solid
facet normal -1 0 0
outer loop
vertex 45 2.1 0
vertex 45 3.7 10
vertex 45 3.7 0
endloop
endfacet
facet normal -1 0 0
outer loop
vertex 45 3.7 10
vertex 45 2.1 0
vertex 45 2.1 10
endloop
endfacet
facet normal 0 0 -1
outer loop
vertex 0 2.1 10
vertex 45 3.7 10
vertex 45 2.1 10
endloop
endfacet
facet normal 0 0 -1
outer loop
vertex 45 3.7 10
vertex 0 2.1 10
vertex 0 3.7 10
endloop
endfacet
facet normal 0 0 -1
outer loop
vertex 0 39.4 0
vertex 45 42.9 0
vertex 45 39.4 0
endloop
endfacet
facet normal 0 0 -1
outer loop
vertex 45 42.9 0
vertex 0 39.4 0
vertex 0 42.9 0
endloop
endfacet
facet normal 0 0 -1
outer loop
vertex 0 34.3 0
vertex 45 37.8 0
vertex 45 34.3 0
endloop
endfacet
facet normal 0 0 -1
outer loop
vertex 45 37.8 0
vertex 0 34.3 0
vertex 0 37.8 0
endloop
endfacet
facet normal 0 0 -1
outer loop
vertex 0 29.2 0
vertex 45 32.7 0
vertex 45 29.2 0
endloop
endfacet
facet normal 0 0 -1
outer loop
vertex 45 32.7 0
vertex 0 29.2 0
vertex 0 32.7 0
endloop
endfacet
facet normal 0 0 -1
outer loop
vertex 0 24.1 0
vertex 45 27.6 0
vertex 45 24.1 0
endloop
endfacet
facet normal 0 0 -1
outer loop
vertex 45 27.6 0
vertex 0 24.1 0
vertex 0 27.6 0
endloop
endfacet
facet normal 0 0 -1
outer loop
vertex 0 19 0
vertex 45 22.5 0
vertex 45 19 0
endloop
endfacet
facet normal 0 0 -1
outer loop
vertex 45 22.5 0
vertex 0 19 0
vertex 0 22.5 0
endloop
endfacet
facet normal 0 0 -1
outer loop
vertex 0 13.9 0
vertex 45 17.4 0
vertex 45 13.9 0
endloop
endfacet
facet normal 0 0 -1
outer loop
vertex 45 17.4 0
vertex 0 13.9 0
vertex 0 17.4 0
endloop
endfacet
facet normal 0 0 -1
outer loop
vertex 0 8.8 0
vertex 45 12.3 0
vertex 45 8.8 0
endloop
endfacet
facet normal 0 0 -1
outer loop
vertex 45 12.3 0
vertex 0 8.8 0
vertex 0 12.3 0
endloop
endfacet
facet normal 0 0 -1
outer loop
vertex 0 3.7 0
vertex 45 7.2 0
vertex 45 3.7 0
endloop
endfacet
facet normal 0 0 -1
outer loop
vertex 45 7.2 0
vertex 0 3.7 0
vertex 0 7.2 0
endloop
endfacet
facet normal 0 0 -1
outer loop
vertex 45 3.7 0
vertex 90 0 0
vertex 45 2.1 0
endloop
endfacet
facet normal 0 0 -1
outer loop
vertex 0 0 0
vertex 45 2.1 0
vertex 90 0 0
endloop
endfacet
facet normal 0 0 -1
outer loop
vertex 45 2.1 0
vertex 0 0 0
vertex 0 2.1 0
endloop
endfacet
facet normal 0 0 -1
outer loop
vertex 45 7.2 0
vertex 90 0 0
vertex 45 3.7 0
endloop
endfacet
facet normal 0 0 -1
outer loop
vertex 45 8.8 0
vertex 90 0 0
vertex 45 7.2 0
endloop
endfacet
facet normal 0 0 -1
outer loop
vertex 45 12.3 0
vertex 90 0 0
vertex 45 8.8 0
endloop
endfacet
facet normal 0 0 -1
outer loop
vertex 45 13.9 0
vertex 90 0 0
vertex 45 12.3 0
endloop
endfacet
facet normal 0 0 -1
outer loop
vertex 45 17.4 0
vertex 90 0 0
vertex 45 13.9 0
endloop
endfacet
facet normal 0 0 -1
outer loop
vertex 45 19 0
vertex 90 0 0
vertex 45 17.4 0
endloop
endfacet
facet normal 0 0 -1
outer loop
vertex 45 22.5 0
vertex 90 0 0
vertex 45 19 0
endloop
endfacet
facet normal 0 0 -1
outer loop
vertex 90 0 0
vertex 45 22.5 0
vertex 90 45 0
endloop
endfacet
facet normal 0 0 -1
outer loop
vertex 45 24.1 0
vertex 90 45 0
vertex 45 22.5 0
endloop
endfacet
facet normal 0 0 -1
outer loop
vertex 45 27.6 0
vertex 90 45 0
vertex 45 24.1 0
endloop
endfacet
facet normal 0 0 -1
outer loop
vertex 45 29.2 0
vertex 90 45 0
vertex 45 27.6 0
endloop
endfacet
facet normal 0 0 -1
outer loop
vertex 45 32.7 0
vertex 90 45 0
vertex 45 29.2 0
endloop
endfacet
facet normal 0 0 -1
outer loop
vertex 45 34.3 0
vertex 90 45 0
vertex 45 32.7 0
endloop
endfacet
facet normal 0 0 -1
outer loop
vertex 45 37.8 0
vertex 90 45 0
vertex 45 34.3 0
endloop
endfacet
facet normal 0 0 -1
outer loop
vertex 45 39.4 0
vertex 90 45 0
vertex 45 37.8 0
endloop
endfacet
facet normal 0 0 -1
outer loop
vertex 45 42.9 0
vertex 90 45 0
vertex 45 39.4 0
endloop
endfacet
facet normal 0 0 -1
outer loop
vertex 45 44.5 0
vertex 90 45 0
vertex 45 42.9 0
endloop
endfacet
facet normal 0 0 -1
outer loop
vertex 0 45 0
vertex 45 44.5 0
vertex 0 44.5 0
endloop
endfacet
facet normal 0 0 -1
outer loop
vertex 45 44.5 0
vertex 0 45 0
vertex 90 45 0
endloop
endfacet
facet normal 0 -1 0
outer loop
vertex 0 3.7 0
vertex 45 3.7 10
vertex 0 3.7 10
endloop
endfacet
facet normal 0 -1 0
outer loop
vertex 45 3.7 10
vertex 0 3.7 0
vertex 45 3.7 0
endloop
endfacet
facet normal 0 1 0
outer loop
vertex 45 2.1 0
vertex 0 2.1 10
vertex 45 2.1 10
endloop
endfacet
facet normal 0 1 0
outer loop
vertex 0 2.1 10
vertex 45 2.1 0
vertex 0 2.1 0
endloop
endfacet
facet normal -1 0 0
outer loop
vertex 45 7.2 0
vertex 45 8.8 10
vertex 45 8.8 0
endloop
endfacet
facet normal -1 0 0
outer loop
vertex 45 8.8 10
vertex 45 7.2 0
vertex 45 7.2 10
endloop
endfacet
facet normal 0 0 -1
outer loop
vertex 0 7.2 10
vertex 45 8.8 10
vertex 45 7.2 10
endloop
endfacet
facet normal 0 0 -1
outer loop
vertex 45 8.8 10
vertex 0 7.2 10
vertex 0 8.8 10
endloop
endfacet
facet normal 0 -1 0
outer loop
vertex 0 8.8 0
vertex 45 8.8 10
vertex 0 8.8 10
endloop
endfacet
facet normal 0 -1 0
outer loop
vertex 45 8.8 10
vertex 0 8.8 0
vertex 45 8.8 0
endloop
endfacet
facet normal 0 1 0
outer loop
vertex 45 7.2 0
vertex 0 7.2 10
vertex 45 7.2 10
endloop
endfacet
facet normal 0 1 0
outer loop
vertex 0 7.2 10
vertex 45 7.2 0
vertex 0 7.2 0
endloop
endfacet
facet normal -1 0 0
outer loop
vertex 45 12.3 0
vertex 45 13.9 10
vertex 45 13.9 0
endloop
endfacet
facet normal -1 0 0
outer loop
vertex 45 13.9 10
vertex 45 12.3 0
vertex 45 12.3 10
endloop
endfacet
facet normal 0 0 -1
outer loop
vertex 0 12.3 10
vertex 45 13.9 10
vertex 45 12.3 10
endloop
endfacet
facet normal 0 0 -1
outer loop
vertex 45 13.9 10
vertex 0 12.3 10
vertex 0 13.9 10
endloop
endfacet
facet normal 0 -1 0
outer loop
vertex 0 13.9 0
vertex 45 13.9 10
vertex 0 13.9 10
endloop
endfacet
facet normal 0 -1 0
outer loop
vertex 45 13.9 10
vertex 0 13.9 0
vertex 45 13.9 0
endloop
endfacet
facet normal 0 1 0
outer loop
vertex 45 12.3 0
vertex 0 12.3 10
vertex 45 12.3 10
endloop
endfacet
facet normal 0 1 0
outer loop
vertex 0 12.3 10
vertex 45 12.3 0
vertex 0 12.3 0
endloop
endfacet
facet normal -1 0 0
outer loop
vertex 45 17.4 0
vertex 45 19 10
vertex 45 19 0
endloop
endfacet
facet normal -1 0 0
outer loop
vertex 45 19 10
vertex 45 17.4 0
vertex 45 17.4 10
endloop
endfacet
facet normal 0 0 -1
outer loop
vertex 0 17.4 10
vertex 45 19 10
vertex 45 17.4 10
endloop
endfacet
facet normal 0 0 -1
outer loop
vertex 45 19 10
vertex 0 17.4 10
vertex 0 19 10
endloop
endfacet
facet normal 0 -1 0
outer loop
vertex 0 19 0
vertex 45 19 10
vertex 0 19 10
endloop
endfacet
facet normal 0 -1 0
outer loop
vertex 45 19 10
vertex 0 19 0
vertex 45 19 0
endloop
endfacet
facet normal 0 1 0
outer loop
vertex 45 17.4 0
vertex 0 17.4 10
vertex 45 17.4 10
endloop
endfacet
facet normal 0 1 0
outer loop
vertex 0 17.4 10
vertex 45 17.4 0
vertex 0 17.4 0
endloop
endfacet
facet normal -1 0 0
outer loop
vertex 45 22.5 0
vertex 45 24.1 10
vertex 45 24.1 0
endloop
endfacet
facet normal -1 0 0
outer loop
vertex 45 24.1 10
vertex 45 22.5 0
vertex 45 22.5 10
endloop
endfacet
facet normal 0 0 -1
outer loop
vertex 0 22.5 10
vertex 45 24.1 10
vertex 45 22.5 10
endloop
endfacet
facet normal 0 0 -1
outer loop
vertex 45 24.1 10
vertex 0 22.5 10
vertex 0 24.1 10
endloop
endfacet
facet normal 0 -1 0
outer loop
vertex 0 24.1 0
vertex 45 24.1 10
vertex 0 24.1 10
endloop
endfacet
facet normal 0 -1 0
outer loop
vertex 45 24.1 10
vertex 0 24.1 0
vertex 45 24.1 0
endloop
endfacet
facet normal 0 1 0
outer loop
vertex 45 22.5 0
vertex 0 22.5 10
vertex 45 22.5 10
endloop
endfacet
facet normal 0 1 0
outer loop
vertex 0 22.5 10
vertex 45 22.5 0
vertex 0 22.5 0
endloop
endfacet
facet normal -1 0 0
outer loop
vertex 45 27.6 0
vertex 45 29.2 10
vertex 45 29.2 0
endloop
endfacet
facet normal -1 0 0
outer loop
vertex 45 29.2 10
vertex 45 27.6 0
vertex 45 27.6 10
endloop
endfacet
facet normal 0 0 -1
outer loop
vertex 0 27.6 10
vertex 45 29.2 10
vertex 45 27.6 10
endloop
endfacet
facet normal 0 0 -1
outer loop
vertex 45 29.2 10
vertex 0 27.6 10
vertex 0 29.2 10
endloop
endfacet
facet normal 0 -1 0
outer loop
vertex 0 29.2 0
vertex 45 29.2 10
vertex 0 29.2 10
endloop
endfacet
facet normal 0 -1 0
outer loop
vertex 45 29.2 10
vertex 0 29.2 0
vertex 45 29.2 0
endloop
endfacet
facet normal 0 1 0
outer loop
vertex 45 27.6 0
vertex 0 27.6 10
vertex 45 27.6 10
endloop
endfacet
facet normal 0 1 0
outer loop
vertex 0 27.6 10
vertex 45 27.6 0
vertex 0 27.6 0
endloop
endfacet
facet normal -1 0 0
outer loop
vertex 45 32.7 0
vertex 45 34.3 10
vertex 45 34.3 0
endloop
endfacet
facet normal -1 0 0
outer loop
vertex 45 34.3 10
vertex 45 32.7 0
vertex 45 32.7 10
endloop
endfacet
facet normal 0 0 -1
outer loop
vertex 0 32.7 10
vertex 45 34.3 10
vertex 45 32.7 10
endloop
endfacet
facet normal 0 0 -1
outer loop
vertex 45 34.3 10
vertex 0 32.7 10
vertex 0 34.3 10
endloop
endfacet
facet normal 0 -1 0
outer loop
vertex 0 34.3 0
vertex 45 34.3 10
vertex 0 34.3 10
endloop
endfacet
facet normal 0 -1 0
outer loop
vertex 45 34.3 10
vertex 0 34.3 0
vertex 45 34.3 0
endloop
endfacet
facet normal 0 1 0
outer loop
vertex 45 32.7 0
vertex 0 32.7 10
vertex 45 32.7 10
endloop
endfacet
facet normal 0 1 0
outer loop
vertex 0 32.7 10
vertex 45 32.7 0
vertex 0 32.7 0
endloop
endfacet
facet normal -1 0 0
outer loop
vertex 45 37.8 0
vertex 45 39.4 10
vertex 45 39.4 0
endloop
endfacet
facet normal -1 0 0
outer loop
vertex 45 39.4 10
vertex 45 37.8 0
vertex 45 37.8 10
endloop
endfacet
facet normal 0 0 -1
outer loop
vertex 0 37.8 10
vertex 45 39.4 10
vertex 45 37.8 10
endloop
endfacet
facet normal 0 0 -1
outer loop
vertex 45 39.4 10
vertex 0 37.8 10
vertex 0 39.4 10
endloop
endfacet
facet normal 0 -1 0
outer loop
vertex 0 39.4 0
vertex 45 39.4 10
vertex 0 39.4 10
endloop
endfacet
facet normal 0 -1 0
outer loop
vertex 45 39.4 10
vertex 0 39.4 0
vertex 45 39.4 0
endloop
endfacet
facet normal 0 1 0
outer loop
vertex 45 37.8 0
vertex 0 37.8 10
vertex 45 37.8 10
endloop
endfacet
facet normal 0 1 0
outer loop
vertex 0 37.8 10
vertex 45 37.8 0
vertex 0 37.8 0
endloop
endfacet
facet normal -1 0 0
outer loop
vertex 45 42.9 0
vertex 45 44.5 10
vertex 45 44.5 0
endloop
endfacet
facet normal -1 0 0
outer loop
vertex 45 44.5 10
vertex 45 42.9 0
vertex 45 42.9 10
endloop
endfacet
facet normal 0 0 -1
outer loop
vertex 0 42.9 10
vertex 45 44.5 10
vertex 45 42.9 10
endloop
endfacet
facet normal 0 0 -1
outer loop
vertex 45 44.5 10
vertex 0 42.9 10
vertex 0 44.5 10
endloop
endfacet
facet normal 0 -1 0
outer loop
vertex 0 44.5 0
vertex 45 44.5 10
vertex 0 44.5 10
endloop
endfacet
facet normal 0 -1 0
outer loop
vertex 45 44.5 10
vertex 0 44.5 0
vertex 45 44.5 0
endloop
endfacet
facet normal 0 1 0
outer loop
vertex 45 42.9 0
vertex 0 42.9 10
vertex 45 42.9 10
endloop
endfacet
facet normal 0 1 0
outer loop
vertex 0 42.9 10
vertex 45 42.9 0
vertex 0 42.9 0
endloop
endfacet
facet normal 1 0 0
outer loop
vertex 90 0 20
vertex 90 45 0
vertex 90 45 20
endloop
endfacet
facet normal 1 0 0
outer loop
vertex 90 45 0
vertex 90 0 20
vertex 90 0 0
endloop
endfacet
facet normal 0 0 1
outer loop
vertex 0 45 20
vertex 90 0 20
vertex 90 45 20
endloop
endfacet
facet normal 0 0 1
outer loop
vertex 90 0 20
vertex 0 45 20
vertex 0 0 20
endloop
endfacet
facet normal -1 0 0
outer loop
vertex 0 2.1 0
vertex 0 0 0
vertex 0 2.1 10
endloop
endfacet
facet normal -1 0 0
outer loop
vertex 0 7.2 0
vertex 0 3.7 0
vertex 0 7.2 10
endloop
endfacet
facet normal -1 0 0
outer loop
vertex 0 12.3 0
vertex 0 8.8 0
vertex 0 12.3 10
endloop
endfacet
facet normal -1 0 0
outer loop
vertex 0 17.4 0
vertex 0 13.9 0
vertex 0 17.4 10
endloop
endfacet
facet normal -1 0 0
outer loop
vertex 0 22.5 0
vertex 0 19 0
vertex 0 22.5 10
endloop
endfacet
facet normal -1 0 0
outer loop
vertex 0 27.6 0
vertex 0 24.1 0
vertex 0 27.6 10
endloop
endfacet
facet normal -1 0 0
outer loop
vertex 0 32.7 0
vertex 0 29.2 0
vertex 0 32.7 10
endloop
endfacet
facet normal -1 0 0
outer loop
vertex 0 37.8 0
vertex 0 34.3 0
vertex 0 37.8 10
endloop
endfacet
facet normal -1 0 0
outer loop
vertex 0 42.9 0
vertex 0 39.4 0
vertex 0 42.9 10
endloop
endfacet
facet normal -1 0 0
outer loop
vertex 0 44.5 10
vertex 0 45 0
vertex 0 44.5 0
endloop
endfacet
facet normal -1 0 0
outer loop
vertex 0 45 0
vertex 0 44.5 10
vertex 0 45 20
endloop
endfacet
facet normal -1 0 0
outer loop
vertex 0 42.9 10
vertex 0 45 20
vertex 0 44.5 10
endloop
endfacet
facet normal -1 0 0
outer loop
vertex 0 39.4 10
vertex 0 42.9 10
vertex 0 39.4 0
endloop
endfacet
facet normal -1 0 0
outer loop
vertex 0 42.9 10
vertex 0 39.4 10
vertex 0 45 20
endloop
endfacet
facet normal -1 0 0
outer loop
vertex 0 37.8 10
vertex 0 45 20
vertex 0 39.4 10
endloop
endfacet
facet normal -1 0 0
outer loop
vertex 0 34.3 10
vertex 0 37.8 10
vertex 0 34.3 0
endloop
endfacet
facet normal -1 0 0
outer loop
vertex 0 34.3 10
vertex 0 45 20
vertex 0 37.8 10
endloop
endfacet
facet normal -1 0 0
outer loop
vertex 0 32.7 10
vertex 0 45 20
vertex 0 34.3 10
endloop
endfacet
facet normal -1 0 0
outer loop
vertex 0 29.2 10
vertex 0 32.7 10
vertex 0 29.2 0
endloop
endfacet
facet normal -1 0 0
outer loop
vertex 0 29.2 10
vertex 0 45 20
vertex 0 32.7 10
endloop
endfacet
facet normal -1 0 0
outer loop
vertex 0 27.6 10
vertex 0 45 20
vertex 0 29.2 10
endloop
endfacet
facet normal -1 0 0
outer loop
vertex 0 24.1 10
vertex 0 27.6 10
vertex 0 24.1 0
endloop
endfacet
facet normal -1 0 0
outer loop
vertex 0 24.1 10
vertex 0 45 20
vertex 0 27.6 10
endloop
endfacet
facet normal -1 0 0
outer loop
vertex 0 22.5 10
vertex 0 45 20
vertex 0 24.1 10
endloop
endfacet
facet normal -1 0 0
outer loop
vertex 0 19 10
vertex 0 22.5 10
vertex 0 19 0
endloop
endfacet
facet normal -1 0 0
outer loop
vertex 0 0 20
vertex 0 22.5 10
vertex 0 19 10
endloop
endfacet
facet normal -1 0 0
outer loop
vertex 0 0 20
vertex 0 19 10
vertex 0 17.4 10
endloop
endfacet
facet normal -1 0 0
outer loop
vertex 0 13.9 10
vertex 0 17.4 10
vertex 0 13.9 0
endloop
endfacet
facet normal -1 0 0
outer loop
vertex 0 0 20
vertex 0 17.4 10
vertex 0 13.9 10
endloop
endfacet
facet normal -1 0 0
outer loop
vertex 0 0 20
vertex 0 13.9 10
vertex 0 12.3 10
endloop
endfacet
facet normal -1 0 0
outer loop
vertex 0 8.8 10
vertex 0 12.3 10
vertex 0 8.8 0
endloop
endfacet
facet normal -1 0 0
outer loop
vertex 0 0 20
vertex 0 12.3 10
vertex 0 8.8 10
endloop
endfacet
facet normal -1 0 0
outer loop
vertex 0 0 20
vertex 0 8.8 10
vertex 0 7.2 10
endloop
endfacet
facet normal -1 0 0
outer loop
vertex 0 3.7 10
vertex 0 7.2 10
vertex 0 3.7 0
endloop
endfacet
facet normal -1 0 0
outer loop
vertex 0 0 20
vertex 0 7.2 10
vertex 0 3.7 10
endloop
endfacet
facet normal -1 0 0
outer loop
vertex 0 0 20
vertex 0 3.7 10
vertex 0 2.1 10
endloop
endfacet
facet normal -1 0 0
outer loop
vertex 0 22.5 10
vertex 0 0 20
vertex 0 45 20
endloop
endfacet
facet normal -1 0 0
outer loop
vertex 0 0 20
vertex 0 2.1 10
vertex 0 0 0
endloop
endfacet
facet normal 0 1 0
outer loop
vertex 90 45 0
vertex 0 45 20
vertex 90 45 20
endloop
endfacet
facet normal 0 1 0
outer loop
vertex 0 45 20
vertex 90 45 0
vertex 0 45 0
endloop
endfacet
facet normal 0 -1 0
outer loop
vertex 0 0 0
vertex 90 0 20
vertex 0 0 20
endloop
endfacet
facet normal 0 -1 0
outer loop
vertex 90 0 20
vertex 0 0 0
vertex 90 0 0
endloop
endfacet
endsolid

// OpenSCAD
// Slide drying rack - a solid base block with a row of parallel slots standing up on their long
// edge, for drying 10 x 75 mm microscope slides. NOVEL general part.
//

slides = 10;
base_l = 90;
base_w = 45;
base_h = 20;
slot_l = 77;
slot_w = 1.6;
slot_d = 10;
pitch   = 3.5;

$fn = 48;

slot_x = (base_l - 2 * slot_l) / 2;
pitch_w = slot_w + pitch;
start_y = (base_w - slides * pitch_w) / 2;

difference() {
    translate([0, 0, 0]) cube([base_l, base_w, base_h]);
    for (i = [0 : slides - 1])
        translate([slot_x, start_y + i * pitch_w, 0]) cube([slot_l, slot_w, base_h - slot_d]);
}
